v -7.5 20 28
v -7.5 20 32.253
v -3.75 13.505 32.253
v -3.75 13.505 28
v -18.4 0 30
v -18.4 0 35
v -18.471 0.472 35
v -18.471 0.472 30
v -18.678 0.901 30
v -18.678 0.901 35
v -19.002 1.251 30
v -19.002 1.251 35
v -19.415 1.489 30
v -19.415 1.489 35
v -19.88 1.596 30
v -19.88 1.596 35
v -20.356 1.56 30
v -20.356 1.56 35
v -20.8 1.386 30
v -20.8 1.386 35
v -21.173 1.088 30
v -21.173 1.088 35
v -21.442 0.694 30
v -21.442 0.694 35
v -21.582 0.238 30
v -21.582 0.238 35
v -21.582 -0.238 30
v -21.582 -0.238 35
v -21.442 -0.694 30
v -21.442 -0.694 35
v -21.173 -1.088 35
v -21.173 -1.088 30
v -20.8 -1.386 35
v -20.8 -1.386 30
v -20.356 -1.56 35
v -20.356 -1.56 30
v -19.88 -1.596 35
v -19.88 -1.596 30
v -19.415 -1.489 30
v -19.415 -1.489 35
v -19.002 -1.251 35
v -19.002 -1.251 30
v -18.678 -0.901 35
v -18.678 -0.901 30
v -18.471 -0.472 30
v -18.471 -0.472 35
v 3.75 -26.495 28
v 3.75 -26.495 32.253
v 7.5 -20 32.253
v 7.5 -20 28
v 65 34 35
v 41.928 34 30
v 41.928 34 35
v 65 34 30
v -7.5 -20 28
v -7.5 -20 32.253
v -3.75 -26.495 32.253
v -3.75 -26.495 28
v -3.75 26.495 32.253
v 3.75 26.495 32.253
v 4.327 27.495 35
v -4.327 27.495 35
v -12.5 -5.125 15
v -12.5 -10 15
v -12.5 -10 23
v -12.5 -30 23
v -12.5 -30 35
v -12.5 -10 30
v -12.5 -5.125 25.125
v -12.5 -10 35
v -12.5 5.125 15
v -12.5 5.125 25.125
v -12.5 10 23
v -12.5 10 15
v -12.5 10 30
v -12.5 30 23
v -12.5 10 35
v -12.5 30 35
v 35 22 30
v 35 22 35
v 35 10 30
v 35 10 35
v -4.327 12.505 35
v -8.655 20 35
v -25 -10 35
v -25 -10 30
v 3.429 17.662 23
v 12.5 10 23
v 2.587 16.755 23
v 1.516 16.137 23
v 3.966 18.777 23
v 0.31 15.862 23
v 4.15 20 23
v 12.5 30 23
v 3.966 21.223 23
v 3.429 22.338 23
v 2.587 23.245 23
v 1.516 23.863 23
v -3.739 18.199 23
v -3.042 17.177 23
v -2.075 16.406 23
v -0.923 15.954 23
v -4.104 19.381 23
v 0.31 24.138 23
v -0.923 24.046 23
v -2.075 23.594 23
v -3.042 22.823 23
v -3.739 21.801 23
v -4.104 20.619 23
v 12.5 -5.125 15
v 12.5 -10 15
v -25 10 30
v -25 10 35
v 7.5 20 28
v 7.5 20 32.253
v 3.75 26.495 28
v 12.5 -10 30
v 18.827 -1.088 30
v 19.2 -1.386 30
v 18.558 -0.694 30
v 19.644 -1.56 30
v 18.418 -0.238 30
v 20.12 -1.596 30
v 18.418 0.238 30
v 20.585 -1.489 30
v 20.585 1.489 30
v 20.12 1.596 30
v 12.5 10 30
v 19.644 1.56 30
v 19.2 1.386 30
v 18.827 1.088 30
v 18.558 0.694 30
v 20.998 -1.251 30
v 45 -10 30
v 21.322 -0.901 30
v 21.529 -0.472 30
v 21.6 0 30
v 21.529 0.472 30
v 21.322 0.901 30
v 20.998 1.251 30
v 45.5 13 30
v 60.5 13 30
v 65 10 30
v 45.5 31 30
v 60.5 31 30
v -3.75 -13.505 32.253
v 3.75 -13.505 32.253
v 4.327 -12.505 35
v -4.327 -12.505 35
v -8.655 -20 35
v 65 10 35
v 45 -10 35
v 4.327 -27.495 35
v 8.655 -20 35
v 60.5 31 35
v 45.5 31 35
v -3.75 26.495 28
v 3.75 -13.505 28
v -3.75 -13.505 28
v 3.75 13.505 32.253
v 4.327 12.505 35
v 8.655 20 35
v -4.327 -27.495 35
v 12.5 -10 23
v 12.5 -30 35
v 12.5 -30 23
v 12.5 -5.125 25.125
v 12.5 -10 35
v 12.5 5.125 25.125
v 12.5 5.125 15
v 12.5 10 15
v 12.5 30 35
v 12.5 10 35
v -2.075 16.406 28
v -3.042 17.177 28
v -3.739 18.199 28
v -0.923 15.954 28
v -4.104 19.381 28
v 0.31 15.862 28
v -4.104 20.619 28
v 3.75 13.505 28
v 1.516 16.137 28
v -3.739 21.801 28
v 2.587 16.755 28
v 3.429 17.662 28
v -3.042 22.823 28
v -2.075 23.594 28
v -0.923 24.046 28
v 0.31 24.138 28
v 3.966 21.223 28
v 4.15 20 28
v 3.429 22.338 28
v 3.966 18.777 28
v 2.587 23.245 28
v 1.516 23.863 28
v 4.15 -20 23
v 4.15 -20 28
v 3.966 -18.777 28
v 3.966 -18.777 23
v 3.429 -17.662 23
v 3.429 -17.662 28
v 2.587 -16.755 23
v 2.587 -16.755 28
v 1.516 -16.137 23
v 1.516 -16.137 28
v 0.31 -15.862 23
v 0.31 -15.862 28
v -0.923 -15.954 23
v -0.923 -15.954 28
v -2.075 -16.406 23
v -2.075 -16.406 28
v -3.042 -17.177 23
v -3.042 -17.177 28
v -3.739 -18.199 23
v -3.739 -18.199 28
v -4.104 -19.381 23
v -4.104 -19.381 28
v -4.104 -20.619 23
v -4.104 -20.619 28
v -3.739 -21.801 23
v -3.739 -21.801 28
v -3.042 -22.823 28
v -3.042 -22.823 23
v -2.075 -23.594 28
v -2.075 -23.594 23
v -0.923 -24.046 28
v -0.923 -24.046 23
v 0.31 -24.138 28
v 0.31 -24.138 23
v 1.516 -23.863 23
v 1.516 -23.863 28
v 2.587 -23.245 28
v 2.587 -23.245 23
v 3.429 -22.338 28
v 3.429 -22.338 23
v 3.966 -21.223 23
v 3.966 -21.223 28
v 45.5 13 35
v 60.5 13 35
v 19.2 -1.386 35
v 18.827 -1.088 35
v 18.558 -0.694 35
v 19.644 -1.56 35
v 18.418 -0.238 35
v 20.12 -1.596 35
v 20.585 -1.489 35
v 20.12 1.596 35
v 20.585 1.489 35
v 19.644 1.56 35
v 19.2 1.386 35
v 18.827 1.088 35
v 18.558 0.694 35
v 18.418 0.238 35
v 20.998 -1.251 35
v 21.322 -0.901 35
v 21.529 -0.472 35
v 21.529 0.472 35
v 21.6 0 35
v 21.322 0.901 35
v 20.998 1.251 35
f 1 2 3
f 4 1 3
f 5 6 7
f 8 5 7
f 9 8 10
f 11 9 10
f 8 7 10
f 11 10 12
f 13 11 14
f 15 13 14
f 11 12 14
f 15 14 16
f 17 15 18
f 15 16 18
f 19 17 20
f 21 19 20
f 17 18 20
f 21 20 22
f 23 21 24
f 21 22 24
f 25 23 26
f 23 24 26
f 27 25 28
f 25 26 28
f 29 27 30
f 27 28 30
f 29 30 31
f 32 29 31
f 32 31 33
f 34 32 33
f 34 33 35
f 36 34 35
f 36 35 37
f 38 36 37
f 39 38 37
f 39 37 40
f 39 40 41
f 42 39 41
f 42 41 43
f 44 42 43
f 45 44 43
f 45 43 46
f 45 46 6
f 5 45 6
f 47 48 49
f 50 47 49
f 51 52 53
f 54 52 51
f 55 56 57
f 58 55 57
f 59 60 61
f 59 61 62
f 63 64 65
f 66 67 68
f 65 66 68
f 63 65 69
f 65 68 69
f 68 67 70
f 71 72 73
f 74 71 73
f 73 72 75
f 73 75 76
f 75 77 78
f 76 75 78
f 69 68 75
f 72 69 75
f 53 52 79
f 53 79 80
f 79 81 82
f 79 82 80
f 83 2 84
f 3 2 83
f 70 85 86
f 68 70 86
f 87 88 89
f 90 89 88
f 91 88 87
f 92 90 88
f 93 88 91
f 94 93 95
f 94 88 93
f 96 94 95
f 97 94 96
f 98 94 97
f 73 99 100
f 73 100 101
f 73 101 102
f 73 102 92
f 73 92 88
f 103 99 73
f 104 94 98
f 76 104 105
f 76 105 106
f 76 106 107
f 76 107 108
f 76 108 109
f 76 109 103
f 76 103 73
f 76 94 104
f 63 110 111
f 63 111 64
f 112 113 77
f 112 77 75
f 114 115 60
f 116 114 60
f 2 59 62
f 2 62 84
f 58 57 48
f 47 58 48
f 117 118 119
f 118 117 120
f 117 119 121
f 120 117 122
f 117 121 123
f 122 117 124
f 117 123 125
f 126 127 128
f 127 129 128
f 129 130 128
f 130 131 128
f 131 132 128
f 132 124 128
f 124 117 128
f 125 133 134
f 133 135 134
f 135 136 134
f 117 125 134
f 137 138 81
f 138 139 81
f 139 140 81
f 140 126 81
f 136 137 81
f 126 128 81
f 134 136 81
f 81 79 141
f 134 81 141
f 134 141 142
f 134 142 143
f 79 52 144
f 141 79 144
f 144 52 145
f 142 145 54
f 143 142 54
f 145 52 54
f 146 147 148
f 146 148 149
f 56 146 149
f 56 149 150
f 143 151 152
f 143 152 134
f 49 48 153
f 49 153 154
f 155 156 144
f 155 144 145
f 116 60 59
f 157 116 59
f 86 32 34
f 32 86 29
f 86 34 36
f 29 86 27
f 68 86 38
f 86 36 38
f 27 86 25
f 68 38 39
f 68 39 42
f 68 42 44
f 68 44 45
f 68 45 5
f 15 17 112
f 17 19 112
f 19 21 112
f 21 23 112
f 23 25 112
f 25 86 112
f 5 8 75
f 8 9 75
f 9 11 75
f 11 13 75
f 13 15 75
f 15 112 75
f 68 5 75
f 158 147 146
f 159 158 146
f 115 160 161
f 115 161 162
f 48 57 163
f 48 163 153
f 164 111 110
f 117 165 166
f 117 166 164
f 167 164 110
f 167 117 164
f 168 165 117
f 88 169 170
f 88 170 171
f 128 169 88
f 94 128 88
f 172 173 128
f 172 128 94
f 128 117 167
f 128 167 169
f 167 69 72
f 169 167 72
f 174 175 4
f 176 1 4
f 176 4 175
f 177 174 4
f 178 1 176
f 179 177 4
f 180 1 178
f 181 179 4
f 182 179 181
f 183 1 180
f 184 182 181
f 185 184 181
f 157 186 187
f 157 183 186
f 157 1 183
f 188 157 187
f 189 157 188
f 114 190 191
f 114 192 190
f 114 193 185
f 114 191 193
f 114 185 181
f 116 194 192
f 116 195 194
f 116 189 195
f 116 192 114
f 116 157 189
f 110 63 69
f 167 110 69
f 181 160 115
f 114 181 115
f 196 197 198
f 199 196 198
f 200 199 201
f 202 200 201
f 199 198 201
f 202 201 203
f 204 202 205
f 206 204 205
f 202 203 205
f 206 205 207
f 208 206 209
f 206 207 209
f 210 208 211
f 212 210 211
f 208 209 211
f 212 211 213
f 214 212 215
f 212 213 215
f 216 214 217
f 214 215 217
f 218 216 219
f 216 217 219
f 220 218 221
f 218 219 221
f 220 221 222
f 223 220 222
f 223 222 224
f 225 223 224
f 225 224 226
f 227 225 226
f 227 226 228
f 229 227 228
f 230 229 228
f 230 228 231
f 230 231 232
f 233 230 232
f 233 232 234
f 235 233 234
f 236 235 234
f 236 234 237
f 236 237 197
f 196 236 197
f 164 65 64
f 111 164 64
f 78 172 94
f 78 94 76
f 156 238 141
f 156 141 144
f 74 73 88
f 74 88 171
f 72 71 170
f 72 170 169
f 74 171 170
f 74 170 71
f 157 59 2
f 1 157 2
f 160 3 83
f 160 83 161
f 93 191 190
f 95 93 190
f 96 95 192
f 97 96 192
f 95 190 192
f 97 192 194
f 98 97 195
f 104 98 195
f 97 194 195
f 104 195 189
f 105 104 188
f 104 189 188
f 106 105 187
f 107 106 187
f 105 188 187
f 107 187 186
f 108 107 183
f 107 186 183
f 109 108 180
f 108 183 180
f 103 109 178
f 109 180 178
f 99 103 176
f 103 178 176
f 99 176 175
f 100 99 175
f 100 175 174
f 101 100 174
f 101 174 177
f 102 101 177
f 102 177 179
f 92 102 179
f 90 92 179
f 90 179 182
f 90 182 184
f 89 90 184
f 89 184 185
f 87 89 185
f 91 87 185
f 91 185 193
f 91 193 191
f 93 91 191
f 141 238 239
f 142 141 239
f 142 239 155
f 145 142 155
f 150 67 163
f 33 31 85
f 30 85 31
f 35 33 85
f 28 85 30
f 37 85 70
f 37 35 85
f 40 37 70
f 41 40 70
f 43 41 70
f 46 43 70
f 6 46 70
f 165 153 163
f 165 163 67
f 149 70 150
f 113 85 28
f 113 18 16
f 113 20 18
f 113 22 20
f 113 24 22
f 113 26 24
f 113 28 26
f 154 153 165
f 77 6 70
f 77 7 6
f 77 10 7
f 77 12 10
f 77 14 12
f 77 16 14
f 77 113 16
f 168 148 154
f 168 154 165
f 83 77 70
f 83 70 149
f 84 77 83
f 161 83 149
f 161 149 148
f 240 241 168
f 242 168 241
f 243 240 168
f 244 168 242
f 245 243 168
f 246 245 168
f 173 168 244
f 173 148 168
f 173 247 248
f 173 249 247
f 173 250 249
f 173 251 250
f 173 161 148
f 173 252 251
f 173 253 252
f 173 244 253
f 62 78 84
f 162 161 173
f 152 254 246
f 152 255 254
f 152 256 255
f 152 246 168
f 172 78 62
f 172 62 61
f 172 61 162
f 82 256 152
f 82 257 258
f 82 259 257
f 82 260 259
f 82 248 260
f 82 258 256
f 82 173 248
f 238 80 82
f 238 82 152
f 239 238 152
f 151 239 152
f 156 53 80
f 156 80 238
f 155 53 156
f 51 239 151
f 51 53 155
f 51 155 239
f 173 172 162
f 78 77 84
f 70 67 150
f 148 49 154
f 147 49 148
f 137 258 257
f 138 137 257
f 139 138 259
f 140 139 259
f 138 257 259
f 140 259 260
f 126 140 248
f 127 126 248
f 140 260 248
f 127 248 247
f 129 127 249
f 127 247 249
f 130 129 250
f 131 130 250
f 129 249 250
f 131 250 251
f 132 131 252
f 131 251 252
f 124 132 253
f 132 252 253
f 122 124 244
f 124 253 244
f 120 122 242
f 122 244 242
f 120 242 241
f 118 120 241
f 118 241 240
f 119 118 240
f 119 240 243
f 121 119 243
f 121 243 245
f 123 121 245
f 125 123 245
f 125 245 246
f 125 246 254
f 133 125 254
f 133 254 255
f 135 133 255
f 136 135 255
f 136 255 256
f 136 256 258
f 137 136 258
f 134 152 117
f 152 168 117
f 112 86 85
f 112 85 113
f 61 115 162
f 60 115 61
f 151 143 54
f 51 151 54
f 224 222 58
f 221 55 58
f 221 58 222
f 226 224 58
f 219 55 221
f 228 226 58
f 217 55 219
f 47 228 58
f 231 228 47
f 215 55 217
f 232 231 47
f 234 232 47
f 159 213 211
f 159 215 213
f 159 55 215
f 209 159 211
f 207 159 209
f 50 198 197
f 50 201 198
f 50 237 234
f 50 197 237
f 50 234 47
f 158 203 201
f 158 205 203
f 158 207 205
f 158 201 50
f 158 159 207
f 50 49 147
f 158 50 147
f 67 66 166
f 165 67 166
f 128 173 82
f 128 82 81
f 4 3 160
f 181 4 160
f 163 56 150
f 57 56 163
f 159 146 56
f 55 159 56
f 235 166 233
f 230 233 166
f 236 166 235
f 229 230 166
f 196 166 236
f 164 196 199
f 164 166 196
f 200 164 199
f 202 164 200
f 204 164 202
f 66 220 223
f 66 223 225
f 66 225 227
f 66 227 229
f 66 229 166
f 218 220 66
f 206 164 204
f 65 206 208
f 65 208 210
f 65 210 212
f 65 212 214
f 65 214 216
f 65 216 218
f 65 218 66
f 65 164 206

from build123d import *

# Parameters (mm, degrees)
SKETCH2_W                = 25
SKETCH2_H                = 20
BOSS_EXTRUDE1_DEPTH      = 30
SKETCH3_W                = 20.25
SKETCH3_H                = 10.25
CUT_EXTRUDE1_DEPTH       = 26
SKETCH4_W                = 50
SKETCH4_H                = 20
BOSS_EXTRUDE2_DEPTH      = 5
SKETCH6_R                = 1.6
CUT_EXTRUDE2_DEPTH       = 36
SKETCH9_W                = 5
SKETCH9_H                = 20
BOSS_EXTRUDE3_DEPTH      = 40
BOSS_EXTRUDE5_START      = -5
SKETCH14_W               = 30
SKETCH14_H               = 24
BOSS_EXTRUDE5_DEPTH      = 5
SKETCH19_W               = 15
SKETCH19_H               = 18
CUT_EXTRUDE5_DEPTH       = 36
CHAMFER1_SIZE            = 12
CHAMFER1_SIZE2           = 6.92820323
CHAMFER2_SIZE            = 20
SKETCH20_W               = 25
SKETCH20_H               = 9
BOSS_EXTRUDE6_DEPTH      = 20
BOSS_EXTRUDE6_DEPTH_BACK = 40
SKETCH21_W               = 25
SKETCH21_H               = 20
CUT_EXTRUDE6_DEPTH       = 15
CUT_EXTRUDE7_DEPTH       = 7
SKETCH23_W               = 25
SKETCH23_H               = 20
BOSS_EXTRUDE7_DEPTH      = 3
SKETCH24_R               = 4.15
CUT_EXTRUDE8_DEPTH       = 14
CHAMFER3_SIZE            = 1
CHAMFER3_SIZE2           = 2.747477419


with BuildPart() as part:
    # Sketch2 → Boss-Extrude1 (new body)
    with BuildSketch(Plane.XY):
        Rectangle(SKETCH2_W, SKETCH2_H)
    extrude(amount=BOSS_EXTRUDE1_DEPTH)

    # Sketch3 → Cut-Extrude1 (cut, through all)
    with BuildSketch(Plane.ZY.offset(12.5)):
        with Locations((15, 0)):
            Rectangle(SKETCH3_W, SKETCH3_H)
    extrude(amount=-CUT_EXTRUDE1_DEPTH, mode=Mode.SUBTRACT)

    # Sketch4 → Boss-Extrude2 (add)
    with BuildSketch(Plane.XY.offset(30)):
        Rectangle(SKETCH4_W, SKETCH4_H)
    extrude(amount=BOSS_EXTRUDE2_DEPTH)

    # Sketch6 → Cut-Extrude2 (cut, through all)
    with BuildSketch(Plane.XY.offset(35)):
        with Locations((-20, 0)):
            Circle(SKETCH6_R)
        with Locations((20, 0)):
            Circle(SKETCH6_R)
    extrude(amount=-CUT_EXTRUDE2_DEPTH, mode=Mode.SUBTRACT)

    # Sketch9 → Boss-Extrude3 (add)
    with BuildSketch(Plane(origin=(25, 0, 0), x_dir=(0, 0, -1), z_dir=(1, 0, 0))):
        with Locations((-32.5, 0)):
            Rectangle(SKETCH9_W, SKETCH9_H)
    extrude(amount=BOSS_EXTRUDE3_DEPTH)

    # Sketch14 → Boss-Extrude5 (add)
    with BuildSketch(Plane.XY.offset(35).offset(BOSS_EXTRUDE5_START)):
        with Locations((50, 22)):
            Rectangle(SKETCH14_W, SKETCH14_H)
    extrude(amount=BOSS_EXTRUDE5_DEPTH)

    # Sketch19 → Cut-Extrude5 (cut, through all)
    with BuildSketch(Plane.XY.offset(35)):
        with Locations((53, 22)):
            Rectangle(SKETCH19_W, SKETCH19_H)
    extrude(amount=-CUT_EXTRUDE5_DEPTH, mode=Mode.SUBTRACT)

    # Chamfer1
    chamfer1_edges = [part.edges().sort_by_distance(p)[0] for p in [
        (35, 34, 32.5),
    ]]
    chamfer1_side = [part.faces().sort_by_distance(p)[0] for p in [
        (35, 22, 32.5),
    ]]
    chamfer(chamfer1_edges, length=CHAMFER1_SIZE, length2=CHAMFER1_SIZE2, reference=chamfer1_side[0])

    # Chamfer2
    chamfer2_edges = [part.edges().sort_by_distance(p)[0] for p in [
        (65, -10, 32.5),
    ]]
    chamfer(chamfer2_edges, length=CHAMFER2_SIZE)

    # Sketch20 → Boss-Extrude6 (add, two sides)
    with BuildSketch(Plane(origin=(0, 10, 0), x_dir=(1, 0, 0), z_dir=(0, 1, 0))) as boss_extrude6_sk:
        with Locations((0, -30.5)):
            Rectangle(SKETCH20_W, SKETCH20_H)
    extrude(amount=BOSS_EXTRUDE6_DEPTH)
    extrude(boss_extrude6_sk.sketch, amount=-BOSS_EXTRUDE6_DEPTH_BACK)

    # Sketch21 → Cut-Extrude6 (cut)
    with BuildSketch(Plane(origin=(0, 0, 0), x_dir=(-1, 0, 0), z_dir=(0, 0, -1))):
        Rectangle(SKETCH21_W, SKETCH21_H)
    extrude(amount=-CUT_EXTRUDE6_DEPTH, mode=Mode.SUBTRACT)

    # Sketch22 → Cut-Extrude7 (cut)
    with BuildSketch(Plane.XY.offset(35)):
        Polygon((7.5, 20), (3.75, 26.495190528), (-3.75, 26.495190528), (-7.5, 20), (-3.75, 13.504809472), (3.75, 13.504809472), align=None)
        Polygon((7.5, -20), (3.75, -13.504809472), (-3.75, -13.504809472), (-7.5, -20), (-3.75, -26.495190528), (3.75, -26.495190528), align=None)
    extrude(amount=-CUT_EXTRUDE7_DEPTH, mode=Mode.SUBTRACT)

    # Sketch23 → Boss-Extrude7 (add)
    with BuildSketch(Plane(origin=(0, 0, 26), x_dir=(-1, 0, 0), z_dir=(0, 0, -1))):
        with Locations((0, 20)):
            Rectangle(SKETCH23_W, SKETCH23_H)
        with Locations((0, -20)):
            Rectangle(SKETCH23_W, SKETCH23_H)
    extrude(amount=BOSS_EXTRUDE7_DEPTH)

    # Sketch24 → Cut-Extrude8 (cut, through all)
    with BuildSketch(Plane.XY.offset(28)):
        with Locations((0, 20)):
            Circle(SKETCH24_R)
        with Locations((0, -20)):
            Circle(SKETCH24_R)
    extrude(amount=-CUT_EXTRUDE8_DEPTH, mode=Mode.SUBTRACT)

    # Chamfer3
    chamfer3_edges = [part.edges().sort_by_distance(p)[0] for p in [
        (5.625, 16.752404736, 35),
        (5.625, 23.247595264, 35),
        (0, 26.495190528, 35),
        (-5.625, 23.247595264, 35),
        (-5.625, 16.752404736, 35),
        (0, 13.504809472, 35),
        (5.625, -23.247595264, 35),
        (5.625, -16.752404736, 35),
        (0, -13.504809472, 35),
        (-5.625, -16.752404736, 35),
        (-5.625, -23.247595264, 35),
        (0, -26.495190528, 35),
    ]]
    chamfer3_side = [part.faces().sort_by_distance(p)[0] for p in [
        (16.470883445, 3.451620449, 35),
    ]]
    chamfer(chamfer3_edges, length=CHAMFER3_SIZE, length2=CHAMFER3_SIZE2, reference=chamfer3_side[0])


solid = part.part
